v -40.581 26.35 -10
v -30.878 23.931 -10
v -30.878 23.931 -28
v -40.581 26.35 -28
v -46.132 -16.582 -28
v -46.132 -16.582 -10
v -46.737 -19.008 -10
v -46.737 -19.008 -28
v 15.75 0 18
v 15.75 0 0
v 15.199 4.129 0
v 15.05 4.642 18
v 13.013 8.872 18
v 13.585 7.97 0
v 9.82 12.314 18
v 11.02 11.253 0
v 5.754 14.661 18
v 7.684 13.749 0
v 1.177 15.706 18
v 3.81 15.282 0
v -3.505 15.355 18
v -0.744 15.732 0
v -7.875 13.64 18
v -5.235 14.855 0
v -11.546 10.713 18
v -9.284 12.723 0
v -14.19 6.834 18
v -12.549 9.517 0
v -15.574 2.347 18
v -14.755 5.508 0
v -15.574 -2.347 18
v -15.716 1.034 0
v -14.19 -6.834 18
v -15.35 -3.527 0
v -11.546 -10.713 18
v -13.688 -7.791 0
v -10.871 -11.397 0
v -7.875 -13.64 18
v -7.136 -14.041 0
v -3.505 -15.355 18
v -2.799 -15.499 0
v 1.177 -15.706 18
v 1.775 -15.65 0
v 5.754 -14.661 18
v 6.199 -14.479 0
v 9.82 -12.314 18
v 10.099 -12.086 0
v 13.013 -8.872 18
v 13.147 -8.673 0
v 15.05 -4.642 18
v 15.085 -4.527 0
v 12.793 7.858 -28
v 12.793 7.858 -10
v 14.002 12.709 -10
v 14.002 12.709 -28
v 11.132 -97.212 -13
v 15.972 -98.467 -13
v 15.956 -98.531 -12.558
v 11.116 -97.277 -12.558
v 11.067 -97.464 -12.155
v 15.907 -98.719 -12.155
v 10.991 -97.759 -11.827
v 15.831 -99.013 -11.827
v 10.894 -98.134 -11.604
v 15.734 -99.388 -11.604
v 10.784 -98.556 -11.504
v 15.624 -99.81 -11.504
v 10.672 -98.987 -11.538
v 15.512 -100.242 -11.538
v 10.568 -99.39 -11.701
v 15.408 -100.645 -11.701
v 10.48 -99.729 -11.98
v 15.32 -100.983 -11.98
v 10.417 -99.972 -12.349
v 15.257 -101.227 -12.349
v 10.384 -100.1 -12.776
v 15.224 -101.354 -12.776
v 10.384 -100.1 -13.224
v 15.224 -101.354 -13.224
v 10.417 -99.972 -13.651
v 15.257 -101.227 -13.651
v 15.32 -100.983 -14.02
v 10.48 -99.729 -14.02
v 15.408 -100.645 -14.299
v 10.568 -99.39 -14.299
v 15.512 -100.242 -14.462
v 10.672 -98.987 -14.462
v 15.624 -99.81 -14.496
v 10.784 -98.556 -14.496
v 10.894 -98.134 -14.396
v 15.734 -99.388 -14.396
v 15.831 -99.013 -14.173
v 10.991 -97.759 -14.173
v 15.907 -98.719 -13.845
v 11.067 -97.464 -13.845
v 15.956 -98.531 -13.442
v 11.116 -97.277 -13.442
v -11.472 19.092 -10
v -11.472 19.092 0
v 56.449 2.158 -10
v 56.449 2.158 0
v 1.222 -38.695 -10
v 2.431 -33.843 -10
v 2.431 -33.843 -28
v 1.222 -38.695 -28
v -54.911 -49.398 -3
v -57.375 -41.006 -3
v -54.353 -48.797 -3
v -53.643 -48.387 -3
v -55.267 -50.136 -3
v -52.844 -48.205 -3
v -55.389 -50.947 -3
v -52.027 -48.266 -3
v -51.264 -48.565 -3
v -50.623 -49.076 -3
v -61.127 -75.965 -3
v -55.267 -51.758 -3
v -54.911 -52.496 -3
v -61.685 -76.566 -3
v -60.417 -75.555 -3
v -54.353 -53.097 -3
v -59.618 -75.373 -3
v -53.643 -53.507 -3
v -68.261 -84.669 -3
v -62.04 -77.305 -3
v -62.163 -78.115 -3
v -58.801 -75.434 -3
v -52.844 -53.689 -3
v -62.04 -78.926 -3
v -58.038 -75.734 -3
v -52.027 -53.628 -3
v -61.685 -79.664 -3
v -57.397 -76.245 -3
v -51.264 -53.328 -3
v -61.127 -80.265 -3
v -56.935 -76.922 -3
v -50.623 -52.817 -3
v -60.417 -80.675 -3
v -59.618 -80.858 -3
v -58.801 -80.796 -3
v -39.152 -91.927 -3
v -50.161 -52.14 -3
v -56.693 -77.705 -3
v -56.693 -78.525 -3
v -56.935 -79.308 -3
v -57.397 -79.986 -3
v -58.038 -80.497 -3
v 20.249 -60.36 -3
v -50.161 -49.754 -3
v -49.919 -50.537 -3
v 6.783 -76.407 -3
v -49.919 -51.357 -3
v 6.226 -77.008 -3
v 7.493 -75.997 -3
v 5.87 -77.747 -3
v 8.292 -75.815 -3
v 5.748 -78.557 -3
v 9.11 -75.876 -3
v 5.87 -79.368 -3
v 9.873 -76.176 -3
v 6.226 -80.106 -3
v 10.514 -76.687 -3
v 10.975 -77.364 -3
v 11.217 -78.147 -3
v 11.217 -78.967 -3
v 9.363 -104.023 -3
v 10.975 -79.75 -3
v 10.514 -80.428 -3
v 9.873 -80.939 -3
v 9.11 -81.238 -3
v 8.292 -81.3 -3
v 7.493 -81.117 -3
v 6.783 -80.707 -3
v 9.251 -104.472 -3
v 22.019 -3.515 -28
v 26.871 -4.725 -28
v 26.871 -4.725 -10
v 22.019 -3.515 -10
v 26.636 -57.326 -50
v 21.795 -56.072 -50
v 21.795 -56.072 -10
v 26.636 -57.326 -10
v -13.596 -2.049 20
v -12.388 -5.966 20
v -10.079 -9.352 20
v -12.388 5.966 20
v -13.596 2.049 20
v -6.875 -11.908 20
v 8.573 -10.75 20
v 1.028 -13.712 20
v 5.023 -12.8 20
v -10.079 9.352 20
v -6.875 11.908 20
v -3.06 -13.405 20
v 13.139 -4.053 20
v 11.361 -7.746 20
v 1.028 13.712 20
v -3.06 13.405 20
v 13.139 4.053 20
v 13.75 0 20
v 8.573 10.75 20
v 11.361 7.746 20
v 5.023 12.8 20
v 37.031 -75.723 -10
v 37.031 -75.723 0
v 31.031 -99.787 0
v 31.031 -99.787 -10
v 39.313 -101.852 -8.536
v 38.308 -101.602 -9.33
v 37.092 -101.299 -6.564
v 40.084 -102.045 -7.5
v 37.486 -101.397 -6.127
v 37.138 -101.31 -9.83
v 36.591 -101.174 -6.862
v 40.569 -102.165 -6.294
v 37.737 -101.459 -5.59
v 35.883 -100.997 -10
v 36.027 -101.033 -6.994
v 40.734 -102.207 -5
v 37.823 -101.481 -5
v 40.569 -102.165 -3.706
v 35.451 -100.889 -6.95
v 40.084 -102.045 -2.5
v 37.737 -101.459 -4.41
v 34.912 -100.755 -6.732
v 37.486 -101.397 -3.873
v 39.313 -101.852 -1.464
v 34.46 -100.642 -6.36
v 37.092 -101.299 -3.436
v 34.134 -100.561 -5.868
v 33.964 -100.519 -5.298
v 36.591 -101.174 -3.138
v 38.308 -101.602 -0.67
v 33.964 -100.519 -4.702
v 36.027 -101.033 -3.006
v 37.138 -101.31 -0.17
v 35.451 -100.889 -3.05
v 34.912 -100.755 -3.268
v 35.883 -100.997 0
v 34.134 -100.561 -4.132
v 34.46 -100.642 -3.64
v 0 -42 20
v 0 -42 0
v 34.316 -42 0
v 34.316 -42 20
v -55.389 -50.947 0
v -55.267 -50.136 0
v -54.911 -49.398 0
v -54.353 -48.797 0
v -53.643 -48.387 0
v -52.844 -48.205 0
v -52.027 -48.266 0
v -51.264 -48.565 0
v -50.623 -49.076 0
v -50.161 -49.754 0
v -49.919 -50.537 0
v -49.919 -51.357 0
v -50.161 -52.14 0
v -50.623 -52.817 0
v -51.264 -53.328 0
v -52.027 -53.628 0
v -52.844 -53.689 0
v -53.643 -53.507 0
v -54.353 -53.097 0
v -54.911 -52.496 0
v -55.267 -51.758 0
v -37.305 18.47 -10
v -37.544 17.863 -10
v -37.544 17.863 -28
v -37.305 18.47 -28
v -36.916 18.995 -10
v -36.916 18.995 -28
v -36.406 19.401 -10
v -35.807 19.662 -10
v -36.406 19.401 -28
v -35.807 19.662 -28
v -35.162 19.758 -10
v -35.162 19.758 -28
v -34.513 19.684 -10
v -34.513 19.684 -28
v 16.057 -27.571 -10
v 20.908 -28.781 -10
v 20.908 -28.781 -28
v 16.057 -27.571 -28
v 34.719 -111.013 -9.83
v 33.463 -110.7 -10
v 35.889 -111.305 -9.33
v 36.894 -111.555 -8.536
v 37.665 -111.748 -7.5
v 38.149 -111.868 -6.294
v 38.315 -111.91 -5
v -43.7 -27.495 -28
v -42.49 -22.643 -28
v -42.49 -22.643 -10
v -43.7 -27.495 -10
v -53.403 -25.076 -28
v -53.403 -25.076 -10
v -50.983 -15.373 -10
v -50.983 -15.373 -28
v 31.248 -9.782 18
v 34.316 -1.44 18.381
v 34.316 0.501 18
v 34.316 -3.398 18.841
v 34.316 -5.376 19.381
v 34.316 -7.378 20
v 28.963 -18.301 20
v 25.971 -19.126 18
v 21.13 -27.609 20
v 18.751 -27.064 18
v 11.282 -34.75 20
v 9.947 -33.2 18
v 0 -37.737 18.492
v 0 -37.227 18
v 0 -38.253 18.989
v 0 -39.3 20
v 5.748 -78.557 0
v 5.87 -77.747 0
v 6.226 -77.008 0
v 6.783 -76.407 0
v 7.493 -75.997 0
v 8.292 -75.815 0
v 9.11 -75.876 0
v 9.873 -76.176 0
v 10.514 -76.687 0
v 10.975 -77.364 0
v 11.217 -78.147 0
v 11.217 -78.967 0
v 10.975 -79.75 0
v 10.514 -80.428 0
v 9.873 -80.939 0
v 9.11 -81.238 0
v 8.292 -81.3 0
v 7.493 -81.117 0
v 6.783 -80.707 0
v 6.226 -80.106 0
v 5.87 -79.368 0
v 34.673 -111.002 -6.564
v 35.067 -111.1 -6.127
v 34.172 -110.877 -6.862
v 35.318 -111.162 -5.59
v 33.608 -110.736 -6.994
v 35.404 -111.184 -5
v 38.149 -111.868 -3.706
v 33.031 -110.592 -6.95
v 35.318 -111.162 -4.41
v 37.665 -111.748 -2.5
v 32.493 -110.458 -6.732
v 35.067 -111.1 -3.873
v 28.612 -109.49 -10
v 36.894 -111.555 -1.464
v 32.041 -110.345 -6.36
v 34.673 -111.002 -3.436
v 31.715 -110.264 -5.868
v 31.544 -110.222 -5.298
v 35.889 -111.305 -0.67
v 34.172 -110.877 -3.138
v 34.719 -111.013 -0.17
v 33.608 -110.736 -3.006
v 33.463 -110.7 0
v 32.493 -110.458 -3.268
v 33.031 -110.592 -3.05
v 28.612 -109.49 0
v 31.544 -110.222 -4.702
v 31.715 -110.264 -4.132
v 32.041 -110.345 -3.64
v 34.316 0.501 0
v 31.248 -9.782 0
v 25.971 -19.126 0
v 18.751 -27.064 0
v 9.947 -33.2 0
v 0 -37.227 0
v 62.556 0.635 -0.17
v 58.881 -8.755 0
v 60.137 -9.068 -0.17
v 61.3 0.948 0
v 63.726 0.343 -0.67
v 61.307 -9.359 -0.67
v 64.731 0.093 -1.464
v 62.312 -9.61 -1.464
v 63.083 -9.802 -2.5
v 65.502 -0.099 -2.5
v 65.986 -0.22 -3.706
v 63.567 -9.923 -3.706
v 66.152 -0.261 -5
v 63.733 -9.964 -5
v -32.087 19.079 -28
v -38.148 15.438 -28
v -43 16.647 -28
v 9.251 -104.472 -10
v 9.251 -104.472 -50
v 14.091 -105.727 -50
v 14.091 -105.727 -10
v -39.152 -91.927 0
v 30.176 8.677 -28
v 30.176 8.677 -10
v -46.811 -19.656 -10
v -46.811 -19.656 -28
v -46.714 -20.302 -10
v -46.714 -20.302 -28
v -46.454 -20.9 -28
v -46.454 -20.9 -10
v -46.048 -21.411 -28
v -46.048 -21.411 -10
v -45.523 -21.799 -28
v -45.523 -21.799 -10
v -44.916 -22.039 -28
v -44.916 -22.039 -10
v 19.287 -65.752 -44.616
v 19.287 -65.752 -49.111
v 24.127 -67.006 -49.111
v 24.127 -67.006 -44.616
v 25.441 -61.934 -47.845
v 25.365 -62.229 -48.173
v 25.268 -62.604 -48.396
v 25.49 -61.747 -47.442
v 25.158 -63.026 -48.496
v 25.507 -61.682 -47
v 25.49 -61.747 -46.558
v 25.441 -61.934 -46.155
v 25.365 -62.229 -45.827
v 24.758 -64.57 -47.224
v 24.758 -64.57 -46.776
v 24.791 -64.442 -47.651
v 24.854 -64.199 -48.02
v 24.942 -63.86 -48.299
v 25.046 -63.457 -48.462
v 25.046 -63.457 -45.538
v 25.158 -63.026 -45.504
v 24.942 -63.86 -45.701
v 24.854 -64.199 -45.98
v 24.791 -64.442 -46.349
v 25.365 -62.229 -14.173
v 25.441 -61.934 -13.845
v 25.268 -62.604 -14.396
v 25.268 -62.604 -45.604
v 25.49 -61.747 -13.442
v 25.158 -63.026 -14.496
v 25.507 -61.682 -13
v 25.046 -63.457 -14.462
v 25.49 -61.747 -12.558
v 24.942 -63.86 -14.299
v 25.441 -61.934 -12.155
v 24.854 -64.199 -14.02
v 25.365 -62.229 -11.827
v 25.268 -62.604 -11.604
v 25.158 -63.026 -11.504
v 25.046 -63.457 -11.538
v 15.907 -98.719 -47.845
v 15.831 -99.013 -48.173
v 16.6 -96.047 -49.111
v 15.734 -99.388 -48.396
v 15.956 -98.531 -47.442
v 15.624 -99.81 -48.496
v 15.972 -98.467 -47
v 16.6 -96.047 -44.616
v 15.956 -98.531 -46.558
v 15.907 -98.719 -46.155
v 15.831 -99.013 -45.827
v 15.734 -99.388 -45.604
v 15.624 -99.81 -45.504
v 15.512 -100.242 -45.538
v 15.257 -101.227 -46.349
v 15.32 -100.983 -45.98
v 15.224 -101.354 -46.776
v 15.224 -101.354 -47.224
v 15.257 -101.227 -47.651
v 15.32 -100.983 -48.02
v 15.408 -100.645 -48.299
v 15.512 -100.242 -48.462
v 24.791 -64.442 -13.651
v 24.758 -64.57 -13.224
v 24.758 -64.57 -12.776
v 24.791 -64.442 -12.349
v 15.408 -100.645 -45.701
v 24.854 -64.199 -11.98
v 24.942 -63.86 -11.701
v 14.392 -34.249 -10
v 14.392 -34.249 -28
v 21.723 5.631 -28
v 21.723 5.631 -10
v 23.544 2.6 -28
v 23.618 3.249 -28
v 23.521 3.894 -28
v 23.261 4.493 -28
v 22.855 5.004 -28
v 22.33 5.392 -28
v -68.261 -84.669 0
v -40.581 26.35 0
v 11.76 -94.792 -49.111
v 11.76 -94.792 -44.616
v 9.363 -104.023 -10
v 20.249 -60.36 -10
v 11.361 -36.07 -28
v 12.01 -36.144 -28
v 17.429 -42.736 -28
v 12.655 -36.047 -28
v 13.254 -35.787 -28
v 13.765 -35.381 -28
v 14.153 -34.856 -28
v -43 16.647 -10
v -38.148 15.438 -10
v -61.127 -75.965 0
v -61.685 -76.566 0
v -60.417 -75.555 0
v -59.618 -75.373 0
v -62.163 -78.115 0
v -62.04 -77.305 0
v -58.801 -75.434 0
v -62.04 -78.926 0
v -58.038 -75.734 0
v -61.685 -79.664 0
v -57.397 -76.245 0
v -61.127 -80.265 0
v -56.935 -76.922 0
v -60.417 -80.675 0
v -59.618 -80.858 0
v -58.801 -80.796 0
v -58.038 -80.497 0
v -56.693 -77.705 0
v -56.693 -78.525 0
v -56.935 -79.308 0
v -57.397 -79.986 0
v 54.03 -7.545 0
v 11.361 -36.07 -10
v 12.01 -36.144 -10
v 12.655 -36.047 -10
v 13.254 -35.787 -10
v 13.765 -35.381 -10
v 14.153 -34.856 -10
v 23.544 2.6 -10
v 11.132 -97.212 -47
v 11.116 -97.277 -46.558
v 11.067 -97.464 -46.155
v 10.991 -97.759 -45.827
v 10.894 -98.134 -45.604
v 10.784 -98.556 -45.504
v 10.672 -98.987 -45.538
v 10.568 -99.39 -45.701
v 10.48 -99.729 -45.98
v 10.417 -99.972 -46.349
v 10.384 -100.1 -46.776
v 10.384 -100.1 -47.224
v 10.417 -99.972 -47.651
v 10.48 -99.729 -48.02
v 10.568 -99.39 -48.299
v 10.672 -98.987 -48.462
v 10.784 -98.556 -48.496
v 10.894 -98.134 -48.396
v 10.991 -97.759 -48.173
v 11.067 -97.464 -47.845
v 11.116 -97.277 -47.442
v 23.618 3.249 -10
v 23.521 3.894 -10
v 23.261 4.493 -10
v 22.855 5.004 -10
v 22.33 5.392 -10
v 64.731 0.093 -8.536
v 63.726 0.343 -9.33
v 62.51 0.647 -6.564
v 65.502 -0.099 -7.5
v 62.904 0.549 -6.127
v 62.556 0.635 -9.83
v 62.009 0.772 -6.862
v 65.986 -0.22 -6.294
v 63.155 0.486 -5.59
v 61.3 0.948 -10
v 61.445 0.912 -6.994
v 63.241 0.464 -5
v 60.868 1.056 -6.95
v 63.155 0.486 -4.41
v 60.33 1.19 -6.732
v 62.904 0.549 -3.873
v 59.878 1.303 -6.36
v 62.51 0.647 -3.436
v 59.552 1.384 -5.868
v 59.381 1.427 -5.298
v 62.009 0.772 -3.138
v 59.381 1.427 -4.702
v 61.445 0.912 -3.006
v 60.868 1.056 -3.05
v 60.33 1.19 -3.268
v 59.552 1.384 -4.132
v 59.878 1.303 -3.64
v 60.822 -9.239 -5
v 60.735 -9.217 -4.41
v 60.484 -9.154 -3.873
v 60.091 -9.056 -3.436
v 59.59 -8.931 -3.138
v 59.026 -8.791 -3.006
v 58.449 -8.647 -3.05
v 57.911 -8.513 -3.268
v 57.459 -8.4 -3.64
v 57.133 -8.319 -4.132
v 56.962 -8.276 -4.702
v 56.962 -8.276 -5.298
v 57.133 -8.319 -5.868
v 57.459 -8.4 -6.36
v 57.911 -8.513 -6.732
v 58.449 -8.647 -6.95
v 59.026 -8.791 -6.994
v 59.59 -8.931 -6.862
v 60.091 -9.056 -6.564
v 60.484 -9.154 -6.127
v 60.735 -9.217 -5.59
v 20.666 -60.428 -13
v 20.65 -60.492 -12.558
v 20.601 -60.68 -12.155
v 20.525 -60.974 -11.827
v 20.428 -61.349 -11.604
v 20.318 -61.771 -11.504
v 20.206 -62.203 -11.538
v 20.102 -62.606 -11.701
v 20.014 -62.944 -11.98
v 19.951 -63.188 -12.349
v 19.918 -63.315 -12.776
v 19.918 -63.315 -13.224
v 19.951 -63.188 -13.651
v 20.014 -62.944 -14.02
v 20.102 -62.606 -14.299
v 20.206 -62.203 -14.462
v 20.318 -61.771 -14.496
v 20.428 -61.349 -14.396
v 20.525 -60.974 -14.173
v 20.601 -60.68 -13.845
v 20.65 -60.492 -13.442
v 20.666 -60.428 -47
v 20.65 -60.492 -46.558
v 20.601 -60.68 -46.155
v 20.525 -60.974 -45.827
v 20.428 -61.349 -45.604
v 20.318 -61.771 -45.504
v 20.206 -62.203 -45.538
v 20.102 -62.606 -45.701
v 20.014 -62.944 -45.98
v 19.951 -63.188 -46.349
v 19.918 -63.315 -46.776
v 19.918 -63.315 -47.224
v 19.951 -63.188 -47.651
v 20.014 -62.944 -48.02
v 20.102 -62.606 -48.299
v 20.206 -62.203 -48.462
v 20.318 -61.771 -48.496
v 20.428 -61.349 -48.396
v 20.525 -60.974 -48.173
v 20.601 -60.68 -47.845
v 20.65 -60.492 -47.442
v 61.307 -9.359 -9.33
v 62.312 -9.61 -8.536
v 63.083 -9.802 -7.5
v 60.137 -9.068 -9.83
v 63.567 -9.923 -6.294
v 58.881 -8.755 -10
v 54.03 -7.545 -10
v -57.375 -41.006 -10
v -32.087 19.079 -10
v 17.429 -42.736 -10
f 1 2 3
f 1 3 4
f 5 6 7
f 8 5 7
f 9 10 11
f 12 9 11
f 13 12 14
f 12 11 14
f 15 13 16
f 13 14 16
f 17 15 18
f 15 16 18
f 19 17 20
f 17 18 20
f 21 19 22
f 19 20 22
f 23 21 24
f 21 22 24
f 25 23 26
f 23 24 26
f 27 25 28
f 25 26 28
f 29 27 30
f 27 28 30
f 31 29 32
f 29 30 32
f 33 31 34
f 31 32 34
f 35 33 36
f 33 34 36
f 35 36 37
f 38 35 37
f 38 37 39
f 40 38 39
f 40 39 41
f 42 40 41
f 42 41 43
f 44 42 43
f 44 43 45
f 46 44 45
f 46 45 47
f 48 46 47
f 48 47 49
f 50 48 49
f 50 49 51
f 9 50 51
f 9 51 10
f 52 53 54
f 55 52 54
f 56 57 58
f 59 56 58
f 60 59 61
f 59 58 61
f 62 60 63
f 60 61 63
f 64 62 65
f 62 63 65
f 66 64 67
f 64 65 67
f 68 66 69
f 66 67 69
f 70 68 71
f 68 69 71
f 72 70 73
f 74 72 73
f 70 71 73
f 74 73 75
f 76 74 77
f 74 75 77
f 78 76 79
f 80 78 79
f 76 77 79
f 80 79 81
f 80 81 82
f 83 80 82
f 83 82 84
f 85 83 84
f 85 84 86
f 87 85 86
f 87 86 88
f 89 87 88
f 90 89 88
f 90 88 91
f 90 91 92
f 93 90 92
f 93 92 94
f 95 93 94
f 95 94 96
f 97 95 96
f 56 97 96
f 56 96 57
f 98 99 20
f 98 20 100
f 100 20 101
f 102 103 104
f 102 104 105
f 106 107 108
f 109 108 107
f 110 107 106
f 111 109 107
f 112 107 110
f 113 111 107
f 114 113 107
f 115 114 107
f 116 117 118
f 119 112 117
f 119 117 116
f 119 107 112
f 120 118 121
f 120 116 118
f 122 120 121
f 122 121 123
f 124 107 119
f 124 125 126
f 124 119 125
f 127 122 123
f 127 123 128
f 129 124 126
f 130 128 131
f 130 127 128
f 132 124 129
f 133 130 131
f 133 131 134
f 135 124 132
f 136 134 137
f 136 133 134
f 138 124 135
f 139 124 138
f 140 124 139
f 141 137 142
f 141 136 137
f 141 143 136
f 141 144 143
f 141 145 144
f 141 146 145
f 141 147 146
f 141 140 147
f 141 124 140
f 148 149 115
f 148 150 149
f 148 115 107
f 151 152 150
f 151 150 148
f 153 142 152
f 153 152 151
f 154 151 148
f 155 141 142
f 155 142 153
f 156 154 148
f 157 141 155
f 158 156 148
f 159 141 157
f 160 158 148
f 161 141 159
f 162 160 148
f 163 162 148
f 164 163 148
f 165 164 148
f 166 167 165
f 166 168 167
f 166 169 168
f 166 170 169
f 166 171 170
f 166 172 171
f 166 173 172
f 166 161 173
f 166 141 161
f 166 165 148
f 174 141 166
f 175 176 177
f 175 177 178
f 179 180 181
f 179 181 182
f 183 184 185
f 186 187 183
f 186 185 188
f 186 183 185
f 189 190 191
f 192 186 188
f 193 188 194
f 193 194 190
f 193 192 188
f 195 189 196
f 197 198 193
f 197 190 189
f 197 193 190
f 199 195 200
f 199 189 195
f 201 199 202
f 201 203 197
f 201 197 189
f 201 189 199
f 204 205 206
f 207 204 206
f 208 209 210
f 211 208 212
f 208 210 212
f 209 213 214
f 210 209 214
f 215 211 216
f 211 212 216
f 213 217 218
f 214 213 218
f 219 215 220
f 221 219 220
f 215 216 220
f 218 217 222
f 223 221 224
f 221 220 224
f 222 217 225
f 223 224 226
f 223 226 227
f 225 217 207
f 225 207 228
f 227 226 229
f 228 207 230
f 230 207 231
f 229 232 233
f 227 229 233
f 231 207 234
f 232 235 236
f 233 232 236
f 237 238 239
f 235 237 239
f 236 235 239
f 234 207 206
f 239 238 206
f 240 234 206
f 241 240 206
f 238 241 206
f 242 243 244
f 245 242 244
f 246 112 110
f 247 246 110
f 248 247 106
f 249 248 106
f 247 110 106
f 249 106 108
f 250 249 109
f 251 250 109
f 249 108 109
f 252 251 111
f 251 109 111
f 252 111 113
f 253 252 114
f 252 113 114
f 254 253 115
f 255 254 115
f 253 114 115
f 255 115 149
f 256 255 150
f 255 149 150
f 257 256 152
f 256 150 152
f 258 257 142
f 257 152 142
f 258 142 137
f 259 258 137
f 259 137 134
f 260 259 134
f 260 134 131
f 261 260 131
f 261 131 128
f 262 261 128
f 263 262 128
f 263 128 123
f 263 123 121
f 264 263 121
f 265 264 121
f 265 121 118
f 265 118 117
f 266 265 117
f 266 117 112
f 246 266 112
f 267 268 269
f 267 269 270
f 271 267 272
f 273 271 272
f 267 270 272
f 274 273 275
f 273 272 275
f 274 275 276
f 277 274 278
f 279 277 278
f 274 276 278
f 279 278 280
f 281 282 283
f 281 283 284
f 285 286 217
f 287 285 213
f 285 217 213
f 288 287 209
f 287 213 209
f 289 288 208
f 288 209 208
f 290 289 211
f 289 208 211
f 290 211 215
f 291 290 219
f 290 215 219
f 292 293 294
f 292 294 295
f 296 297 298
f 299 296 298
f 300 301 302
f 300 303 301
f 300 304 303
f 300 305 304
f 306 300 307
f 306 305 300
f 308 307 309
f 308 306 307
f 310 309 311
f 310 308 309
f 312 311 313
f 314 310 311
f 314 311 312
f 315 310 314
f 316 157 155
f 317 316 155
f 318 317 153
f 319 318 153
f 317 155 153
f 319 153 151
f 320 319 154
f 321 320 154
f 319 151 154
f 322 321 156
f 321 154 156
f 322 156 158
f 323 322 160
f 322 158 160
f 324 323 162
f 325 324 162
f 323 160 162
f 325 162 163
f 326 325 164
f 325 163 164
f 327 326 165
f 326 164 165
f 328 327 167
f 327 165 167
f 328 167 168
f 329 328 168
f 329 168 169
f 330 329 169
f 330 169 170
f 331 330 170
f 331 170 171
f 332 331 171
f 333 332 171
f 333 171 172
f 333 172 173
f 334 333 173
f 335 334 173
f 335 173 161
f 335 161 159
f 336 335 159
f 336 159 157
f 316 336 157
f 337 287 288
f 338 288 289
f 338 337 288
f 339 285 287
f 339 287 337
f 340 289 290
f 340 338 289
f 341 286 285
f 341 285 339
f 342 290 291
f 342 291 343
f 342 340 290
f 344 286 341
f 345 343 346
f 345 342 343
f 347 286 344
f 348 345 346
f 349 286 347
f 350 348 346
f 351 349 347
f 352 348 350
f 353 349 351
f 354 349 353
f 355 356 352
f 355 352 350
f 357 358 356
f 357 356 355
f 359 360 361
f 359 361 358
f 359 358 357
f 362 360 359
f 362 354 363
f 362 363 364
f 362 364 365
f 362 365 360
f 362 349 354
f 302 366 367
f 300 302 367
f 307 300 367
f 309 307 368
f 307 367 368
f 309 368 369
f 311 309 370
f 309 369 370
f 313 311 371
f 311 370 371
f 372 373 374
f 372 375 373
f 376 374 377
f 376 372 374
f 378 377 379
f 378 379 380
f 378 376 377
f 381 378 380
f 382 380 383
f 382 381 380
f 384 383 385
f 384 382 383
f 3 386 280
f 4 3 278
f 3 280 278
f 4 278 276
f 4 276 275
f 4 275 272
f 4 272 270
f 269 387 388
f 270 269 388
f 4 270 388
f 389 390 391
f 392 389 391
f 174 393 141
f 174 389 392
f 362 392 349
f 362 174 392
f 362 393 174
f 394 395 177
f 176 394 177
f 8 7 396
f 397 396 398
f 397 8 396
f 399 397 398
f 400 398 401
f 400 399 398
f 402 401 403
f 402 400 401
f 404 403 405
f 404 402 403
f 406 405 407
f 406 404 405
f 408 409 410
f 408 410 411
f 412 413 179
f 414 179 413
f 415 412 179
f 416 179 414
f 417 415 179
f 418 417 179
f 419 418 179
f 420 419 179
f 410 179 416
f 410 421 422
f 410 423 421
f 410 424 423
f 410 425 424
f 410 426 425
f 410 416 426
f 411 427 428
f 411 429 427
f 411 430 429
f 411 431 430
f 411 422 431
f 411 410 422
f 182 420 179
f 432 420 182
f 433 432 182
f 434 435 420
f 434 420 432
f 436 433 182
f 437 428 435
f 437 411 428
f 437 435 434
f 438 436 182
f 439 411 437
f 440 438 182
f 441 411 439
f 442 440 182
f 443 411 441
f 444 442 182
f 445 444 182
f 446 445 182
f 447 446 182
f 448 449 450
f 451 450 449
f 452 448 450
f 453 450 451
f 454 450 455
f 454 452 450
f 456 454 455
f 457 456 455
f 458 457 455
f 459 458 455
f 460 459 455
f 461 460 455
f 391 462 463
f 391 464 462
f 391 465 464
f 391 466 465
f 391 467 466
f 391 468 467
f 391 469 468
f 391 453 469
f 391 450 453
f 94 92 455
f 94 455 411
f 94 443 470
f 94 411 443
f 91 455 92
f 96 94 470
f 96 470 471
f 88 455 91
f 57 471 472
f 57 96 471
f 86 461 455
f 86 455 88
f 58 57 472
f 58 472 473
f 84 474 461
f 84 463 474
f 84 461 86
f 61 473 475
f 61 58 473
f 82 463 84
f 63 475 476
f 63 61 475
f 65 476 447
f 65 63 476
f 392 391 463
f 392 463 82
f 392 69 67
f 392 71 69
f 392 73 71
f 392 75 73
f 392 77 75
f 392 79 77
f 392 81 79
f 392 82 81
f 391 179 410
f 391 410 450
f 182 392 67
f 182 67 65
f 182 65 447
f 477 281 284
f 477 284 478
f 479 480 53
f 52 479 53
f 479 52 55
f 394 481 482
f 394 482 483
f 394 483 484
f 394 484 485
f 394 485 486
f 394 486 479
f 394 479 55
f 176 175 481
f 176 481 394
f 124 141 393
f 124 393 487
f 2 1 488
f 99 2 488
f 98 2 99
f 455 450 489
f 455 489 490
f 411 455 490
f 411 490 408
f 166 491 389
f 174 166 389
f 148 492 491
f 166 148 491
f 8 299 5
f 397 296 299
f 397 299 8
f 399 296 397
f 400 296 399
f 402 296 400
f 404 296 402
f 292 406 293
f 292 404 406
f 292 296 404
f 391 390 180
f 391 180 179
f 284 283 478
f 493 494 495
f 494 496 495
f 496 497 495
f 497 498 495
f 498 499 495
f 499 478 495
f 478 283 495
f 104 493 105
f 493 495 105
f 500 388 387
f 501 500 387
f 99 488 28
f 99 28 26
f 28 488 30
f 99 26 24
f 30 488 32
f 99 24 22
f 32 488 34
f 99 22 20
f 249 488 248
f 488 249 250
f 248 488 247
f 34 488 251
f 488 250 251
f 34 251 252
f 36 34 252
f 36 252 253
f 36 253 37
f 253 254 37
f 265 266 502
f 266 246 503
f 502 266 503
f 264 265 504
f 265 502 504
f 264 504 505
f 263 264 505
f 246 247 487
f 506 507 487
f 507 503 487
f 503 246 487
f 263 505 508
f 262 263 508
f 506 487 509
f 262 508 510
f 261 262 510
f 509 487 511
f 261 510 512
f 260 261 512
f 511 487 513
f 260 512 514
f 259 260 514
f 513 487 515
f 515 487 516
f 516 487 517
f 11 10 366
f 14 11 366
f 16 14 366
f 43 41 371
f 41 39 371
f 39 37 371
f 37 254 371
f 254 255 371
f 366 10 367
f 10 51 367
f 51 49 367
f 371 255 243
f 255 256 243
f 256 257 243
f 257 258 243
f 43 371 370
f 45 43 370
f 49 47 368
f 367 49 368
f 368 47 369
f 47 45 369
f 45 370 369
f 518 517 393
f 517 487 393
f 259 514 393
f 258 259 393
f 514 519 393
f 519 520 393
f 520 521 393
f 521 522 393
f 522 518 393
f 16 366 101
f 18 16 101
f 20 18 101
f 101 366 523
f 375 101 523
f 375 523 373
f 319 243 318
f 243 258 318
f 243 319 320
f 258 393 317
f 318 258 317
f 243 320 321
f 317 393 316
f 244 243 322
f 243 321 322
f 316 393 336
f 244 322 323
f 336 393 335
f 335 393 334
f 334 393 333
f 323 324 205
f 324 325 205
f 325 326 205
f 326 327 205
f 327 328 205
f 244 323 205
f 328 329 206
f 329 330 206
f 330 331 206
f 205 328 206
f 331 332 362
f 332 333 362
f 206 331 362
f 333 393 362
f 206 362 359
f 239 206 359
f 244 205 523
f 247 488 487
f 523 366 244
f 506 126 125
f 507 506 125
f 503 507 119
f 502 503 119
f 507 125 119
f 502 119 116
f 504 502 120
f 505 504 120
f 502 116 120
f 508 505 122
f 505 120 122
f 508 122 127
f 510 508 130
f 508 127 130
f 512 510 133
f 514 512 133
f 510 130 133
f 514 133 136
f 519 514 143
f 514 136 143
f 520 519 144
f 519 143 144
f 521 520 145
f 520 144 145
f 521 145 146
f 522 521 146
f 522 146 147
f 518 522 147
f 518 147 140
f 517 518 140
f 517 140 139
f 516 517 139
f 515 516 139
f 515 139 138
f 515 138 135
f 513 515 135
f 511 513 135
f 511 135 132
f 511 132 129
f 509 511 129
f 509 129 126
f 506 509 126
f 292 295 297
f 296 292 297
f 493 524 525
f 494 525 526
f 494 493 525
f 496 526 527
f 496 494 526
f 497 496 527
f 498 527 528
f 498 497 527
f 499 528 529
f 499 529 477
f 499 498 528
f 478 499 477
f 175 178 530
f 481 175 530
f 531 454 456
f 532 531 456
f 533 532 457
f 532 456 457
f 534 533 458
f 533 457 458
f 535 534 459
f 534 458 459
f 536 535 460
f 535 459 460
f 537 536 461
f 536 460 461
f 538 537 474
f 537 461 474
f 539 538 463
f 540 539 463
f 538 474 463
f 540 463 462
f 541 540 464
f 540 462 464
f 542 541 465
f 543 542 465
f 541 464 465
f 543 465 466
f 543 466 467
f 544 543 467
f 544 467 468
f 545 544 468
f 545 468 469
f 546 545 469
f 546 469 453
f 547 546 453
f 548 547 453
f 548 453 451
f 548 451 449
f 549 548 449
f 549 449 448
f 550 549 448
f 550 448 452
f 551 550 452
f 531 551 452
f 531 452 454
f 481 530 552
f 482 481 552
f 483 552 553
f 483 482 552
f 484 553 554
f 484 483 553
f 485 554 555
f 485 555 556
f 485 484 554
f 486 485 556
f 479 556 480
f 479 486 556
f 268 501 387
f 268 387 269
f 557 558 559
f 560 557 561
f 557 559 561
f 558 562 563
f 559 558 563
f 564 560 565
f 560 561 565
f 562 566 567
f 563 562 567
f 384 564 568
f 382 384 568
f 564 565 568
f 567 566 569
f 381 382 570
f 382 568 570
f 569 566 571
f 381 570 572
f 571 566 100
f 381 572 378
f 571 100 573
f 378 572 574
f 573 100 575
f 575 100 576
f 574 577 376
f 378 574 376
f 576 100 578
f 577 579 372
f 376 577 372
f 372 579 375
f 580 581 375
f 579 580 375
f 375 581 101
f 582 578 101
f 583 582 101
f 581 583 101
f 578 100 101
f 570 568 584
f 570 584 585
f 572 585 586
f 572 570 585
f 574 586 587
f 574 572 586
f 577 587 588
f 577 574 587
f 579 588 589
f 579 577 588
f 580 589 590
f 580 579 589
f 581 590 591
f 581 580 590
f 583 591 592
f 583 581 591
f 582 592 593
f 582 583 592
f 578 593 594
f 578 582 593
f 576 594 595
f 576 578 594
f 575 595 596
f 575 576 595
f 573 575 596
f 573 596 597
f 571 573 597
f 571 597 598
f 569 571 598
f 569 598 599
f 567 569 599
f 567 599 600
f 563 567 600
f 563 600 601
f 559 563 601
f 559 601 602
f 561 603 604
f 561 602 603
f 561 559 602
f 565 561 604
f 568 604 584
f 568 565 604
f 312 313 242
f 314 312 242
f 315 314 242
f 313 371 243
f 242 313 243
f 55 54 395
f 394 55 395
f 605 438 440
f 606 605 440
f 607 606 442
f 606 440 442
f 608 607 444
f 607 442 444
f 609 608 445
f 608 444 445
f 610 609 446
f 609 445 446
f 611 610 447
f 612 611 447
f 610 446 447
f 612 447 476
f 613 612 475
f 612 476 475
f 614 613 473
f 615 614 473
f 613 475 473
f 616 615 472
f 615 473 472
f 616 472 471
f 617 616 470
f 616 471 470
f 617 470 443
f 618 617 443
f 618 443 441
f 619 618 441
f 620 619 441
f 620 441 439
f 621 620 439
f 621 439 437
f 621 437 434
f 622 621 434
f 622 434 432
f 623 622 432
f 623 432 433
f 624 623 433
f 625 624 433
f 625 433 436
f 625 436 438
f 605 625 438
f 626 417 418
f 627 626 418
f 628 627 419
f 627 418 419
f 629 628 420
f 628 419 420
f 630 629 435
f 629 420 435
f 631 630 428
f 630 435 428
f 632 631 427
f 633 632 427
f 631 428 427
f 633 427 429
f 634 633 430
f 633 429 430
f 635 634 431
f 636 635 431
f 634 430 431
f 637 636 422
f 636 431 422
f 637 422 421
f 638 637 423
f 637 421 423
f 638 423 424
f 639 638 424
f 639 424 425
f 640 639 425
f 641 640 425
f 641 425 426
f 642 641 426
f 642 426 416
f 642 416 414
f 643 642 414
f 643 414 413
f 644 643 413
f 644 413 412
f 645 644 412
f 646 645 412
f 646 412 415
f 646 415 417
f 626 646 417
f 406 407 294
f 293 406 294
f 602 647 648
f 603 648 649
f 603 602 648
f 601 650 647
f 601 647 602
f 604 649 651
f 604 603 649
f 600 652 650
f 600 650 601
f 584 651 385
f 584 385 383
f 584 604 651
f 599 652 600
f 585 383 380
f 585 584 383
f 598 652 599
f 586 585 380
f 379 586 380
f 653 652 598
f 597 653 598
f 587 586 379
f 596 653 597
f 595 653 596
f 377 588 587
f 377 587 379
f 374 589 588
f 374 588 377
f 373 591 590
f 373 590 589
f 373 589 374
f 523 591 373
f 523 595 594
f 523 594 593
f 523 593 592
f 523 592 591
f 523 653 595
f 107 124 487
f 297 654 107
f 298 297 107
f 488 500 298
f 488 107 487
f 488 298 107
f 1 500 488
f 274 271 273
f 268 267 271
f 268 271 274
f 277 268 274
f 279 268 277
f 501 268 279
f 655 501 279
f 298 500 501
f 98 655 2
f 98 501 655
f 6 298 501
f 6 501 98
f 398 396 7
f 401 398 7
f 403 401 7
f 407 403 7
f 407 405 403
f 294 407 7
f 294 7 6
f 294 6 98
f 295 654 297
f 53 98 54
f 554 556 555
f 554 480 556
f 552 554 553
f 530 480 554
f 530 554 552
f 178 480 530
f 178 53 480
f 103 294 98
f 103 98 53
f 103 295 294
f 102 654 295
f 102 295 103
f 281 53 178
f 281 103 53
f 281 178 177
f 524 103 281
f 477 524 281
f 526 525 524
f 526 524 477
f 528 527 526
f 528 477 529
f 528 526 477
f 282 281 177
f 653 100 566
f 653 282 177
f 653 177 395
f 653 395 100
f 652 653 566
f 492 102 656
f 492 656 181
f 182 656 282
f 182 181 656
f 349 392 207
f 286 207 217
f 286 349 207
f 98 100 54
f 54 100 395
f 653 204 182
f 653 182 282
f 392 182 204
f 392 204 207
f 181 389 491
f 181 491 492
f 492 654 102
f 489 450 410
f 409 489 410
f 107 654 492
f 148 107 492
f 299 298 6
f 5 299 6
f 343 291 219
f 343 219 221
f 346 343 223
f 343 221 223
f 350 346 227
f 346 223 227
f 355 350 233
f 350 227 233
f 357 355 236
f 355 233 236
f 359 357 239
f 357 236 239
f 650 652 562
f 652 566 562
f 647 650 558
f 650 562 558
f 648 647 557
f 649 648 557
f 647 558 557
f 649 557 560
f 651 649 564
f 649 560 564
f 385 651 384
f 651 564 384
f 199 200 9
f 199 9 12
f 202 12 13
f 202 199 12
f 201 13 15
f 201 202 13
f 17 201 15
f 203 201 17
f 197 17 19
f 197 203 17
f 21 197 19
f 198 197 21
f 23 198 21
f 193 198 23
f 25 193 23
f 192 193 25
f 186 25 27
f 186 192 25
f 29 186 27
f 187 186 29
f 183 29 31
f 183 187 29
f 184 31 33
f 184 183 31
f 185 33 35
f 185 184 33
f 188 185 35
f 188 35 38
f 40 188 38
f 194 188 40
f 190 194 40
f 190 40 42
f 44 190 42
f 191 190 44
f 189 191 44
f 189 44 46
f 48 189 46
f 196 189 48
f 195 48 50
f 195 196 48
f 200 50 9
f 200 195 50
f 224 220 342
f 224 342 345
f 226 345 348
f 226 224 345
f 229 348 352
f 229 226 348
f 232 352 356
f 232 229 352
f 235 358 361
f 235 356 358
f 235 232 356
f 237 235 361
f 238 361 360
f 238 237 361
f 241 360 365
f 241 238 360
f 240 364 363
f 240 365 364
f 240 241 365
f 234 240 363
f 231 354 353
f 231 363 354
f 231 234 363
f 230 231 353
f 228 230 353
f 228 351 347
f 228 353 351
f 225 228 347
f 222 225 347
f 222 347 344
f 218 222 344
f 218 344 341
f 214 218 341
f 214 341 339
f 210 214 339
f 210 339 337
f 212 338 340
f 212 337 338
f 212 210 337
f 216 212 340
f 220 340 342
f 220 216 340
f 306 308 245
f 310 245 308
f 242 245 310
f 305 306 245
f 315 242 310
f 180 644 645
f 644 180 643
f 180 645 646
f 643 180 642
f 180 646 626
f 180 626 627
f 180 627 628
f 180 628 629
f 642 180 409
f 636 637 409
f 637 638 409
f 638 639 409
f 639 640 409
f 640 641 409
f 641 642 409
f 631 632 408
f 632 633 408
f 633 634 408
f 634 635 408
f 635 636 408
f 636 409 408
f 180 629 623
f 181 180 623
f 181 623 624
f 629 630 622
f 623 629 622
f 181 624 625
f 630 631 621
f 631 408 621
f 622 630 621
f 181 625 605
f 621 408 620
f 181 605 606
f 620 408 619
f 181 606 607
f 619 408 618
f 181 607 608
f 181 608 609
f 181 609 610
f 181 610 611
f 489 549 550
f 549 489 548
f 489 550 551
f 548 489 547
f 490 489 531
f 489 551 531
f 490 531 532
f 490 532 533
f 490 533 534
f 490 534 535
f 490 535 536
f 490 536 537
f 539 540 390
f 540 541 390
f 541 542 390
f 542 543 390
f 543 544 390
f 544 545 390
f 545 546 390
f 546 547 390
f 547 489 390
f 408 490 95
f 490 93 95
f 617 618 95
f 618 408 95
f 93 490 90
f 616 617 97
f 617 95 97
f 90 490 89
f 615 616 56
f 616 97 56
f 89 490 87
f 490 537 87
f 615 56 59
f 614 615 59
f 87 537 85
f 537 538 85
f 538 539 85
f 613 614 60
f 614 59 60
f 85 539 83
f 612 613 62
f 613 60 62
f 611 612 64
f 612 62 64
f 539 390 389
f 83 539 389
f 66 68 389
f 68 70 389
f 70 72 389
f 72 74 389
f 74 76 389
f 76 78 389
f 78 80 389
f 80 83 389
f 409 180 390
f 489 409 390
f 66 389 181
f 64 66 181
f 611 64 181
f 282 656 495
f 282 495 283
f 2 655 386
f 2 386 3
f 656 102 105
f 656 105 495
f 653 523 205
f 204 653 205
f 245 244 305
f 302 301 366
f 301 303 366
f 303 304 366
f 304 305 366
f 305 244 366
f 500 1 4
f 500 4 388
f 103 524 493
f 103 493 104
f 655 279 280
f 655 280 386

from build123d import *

# Parameters (mm, degrees)
SKETCH_1_R               = 15.75
EXTRUDE_1_DEPTH          = 20
EXTRUDE_1_2_DEPTH        = 20
EXTRUDE_5_DEPTH          = 10
CHAMFER_3_SIZE           = 2
SKETCH_18_W              = 10
SKETCH_18_H              = 10
EXTRUDE_6_DEPTH          = 10
CUT_EXTRUDE_1_DEPTH      = 148.860951012
CUT_EXTRUDE_1_DEPTH_BACK = 148.860951012
SKETCH_19_R              = 2
FILLET_2_R               = 5
EXTRUDE_7_DEPTH          = 10
CUT_EXTRUDE_2_DEPTH      = 7
SKETCH_23_R              = 2.75
CUT_EXTRUDE_3_DEPTH      = 7
EXTRUDE_9_DEPTH          = 18
FILLET_3_R               = 2.5
SKETCH_28_W              = 5
SKETCH_28_H              = 40
EXTRUDE_10_DEPTH         = 50
SKETCH_29_R              = 1.5
SKETCH_29_W              = 30
SKETCH_29_H              = 4.494622667
CUT_EXTRUDE_4_DEPTH      = 50


with BuildPart() as part:
    # 스케치1 → 보스-돌출1 (new body)
    with BuildSketch(Plane(origin=(0, 0, 0), x_dir=(0, 1, 0), z_dir=(0, 0, 1))):
        with Locations(Location((0, 0, 0), (0, 0, 270))):
            Circle(SKETCH_1_R)
    extrude(amount=EXTRUDE_1_DEPTH)



with BuildPart() as body_2:
    # 스케치1 → Extrude 1 2 (new body)
    with BuildSketch(Plane(origin=(0, 0, 0), x_dir=(0, 1, 0), z_dir=(0, 0, 1))):
        with BuildLine():
            ThreePointArc((0.501055918, -34.316325355), (-23.297606239, -22.583389768), (-37.227021319, 0))
            Line((-37.227021319, 0), (-42, 0))
            Line((-42, 0), (-42, -34.316325355))
            Line((-42, -34.316325355), (0.501055918, -34.316325355))
        make_face()
    extrude(amount=EXTRUDE_1_2_DEPTH)


with BuildPart() as part_1:
    add(part.part)

    add(body_2.part)  # 보스-돌출5 merges body 2
    # 스케치17 → 보스-돌출5 (add)
    with BuildSketch(Plane(origin=(0, 0, 0), x_dir=(-1, 0, 0), z_dir=(0, 0, -1))):
        Polygon((-56.448813006, 2.157894853), (-37.030930328, -75.722978764), (-28.611757259, -109.490437583), (39.152120893, -91.926923446), (30.889770512, -58.788446072), (11.471887833, 19.092427545), align=None)
    extrude(amount=EXTRUDE_5_DEPTH)

    # 모따기3
    chamfer_3_edges = [part_1.edges().sort_by_distance(p)[0] for p in [
        (22.583389768, -23.297606239, 20),
        (-15.75, 0, 20),
    ]]
    chamfer(chamfer_3_edges, length=CHAMFER_3_SIZE)

    # 스케치18 → 보스-돌출6 (add)
    with BuildSketch(Plane(origin=(52.63854315, -13.124262836, 0), x_dir=(0.24192189559966906, 0.9702957262759961, 0), z_dir=(0.9702957262759961, -0.24192189559966906, 0))):
        with Locations((-94.316293102, -5)):
            Rectangle(SKETCH_18_W, SKETCH_18_H)
        with Locations((10.75, -5)):
            Rectangle(SKETCH_18_W, SKETCH_18_H)
    extrude(amount=EXTRUDE_6_DEPTH)

    # 스케치19 → 컷-돌출1 (cut, two sides: drawn at the far end of the back side and taken through both)
    with BuildSketch(Plane(origin=(-24.026785891, -96.366174746, 0), x_dir=(0.9702957262759961, -0.24192189559966903, 0), z_dir=(-0.24192189559966903, -0.9702957262759961, 0)).offset(-CUT_EXTRUDE_1_DEPTH_BACK)):
        with Locations((59.25, -5)):
            Circle(SKETCH_19_R)
    extrude(amount=CUT_EXTRUDE_1_DEPTH + CUT_EXTRUDE_1_DEPTH_BACK, mode=Mode.SUBTRACT)

    # 필렛2
    fillet_2_edges = [part_1.edges().sort_by_distance(p)[0] for p in [
        (64.942160791, -5.112802735, -10),
        (64.942160791, -5.112802735, 0),
        (39.524324, -107.058177907, -10),
        (39.524324, -107.058177907, 0),
    ]]
    fillet(fillet_2_edges, radius=FILLET_2_R - 0.0001)  # a hair under: the kernel refuses the full size

    # 스케치21 → 보스-돌출7 (add)
    with BuildSketch(Plane(origin=(0, 0, -10), x_dir=(1, 0, 0), z_dir=(0, 0, -1))):
        Polygon((-11.471887833, -19.092427545), (-39.152120893, 91.926923446), (-68.260992681, 84.669266578), (-40.580759621, -26.350084413), align=None)
    extrude(amount=-EXTRUDE_7_DEPTH)

    # 스케치22 → 컷-돌출2 (cut)
    with BuildSketch(Plane(origin=(0, 0, -10), x_dir=(1, 0, 0), z_dir=(0, 0, -1))):
        Polygon((-68.260992681, 84.669266578), (-57.374507379, 41.005958895), (20.249150723, 60.359710543), (9.362665421, 104.023018226), (4.374510381, 124.029415356), (-73.249147721, 104.675663708), align=None)
    extrude(amount=-CUT_EXTRUDE_2_DEPTH, mode=Mode.SUBTRACT)

    # 스케치23 → 컷-돌출3 (cut)
    with BuildSketch(Plane(origin=(0, 0, -3), x_dir=(1, 0, 0), z_dir=(0, 0, -1))):
        with Locations(Location((8.49768178, 78.557319663, 0), (0, 0, 180))):
            Circle(SKETCH_23_R)
        with Locations(Location((-52.638773407, 50.946925838, 0), (0, 0, 180))):
            Circle(SKETCH_23_R)
        with Locations(Location((-59.412586484, 78.115206174, 0), (0, 0, 180))):
            Circle(SKETCH_23_R)
    extrude(amount=-CUT_EXTRUDE_3_DEPTH, mode=Mode.SUBTRACT)

    # 스케치27 → 보스-돌출9 (add)
    with BuildSketch(Plane(origin=(0, 0, -10), x_dir=(1, 0, 0), z_dir=(0, 0, -1))):
        Polygon((-42.999978577, -16.64712715), (-38.148499946, -15.437517672), (-36.938890468, -20.288996303), (-32.087411837, -19.079386825), (-30.877802359, -23.930865457), (-40.580759621, -26.350084413), align=None)
        Polygon((-47.341531979, 21.433719927), (-42.490053347, 22.643329405), (-43.699662825, 27.494808036), (-53.402620088, 25.07558908), (-50.983401132, 15.372631817), (-46.131922501, 16.582241295), align=None)
        Polygon((1.221618851, 38.694941482), (17.42896793, 42.735887459), (20.908348254, 28.780855193), (16.056869623, 27.571245715), (13.787098777, 36.674799349), (2.431228329, 33.84346285), align=None)
        Polygon((26.870688445, 4.724510909), (22.019209813, 3.514901431), (24.148746591, -5.026204076), (12.792876144, -7.857540575), (14.002485622, -12.709019206), (30.175814481, -8.676555422), align=None)
    extrude(amount=EXTRUDE_9_DEPTH)

    # 필렛3
    fillet_3_edges = [part_1.edges().sort_by_distance(p)[0] for p in [
        (-36.938890468, 20.288996303, -19),
        (13.787098777, -36.674799349, -19),
        (24.148746591, 5.026204076, -19),
        (-47.341531979, -21.433719927, -19),
    ]]
    fillet(fillet_3_edges, radius=FILLET_3_R)

    # 스케치28 → 보스-돌출10 (add)
    with BuildSketch(Plane(origin=(-24.791009663, -95.649136326, 0), x_dir=(0.9680138959056901, -0.25089658693072686, 0), z_dir=(-0.25089658693072686, -0.9680138959056901, 0))):
        with Locations((37.666498149, -30)):
            Rectangle(SKETCH_28_W, SKETCH_28_H)
    extrude(amount=-EXTRUDE_10_DEPTH)

    # 스케치29 → 컷-돌출4 (cut)
    with BuildSketch(Plane(origin=(38.881728358, -10.077637295, 0), x_dir=(0.25089658693072686, 0.9680138959056901, 0), z_dir=(0.9680138959056901, -0.25089658693072686, 0))):
        with Locations((-54.809672806, -47)):
            Circle(SKETCH_29_R)
        with Locations((-92.809672806, -47)):
            Circle(SKETCH_29_R)
        with Locations((-92.809672806, -13)):
            Circle(SKETCH_29_R)
        with Locations((-54.809672806, -13)):
            Circle(SKETCH_29_R)
        with Locations((-73.809672806, -46.863560509)):
            Rectangle(SKETCH_29_W, SKETCH_29_H)
    extrude(amount=-CUT_EXTRUDE_4_DEPTH, mode=Mode.SUBTRACT)


solid = part_1.part
